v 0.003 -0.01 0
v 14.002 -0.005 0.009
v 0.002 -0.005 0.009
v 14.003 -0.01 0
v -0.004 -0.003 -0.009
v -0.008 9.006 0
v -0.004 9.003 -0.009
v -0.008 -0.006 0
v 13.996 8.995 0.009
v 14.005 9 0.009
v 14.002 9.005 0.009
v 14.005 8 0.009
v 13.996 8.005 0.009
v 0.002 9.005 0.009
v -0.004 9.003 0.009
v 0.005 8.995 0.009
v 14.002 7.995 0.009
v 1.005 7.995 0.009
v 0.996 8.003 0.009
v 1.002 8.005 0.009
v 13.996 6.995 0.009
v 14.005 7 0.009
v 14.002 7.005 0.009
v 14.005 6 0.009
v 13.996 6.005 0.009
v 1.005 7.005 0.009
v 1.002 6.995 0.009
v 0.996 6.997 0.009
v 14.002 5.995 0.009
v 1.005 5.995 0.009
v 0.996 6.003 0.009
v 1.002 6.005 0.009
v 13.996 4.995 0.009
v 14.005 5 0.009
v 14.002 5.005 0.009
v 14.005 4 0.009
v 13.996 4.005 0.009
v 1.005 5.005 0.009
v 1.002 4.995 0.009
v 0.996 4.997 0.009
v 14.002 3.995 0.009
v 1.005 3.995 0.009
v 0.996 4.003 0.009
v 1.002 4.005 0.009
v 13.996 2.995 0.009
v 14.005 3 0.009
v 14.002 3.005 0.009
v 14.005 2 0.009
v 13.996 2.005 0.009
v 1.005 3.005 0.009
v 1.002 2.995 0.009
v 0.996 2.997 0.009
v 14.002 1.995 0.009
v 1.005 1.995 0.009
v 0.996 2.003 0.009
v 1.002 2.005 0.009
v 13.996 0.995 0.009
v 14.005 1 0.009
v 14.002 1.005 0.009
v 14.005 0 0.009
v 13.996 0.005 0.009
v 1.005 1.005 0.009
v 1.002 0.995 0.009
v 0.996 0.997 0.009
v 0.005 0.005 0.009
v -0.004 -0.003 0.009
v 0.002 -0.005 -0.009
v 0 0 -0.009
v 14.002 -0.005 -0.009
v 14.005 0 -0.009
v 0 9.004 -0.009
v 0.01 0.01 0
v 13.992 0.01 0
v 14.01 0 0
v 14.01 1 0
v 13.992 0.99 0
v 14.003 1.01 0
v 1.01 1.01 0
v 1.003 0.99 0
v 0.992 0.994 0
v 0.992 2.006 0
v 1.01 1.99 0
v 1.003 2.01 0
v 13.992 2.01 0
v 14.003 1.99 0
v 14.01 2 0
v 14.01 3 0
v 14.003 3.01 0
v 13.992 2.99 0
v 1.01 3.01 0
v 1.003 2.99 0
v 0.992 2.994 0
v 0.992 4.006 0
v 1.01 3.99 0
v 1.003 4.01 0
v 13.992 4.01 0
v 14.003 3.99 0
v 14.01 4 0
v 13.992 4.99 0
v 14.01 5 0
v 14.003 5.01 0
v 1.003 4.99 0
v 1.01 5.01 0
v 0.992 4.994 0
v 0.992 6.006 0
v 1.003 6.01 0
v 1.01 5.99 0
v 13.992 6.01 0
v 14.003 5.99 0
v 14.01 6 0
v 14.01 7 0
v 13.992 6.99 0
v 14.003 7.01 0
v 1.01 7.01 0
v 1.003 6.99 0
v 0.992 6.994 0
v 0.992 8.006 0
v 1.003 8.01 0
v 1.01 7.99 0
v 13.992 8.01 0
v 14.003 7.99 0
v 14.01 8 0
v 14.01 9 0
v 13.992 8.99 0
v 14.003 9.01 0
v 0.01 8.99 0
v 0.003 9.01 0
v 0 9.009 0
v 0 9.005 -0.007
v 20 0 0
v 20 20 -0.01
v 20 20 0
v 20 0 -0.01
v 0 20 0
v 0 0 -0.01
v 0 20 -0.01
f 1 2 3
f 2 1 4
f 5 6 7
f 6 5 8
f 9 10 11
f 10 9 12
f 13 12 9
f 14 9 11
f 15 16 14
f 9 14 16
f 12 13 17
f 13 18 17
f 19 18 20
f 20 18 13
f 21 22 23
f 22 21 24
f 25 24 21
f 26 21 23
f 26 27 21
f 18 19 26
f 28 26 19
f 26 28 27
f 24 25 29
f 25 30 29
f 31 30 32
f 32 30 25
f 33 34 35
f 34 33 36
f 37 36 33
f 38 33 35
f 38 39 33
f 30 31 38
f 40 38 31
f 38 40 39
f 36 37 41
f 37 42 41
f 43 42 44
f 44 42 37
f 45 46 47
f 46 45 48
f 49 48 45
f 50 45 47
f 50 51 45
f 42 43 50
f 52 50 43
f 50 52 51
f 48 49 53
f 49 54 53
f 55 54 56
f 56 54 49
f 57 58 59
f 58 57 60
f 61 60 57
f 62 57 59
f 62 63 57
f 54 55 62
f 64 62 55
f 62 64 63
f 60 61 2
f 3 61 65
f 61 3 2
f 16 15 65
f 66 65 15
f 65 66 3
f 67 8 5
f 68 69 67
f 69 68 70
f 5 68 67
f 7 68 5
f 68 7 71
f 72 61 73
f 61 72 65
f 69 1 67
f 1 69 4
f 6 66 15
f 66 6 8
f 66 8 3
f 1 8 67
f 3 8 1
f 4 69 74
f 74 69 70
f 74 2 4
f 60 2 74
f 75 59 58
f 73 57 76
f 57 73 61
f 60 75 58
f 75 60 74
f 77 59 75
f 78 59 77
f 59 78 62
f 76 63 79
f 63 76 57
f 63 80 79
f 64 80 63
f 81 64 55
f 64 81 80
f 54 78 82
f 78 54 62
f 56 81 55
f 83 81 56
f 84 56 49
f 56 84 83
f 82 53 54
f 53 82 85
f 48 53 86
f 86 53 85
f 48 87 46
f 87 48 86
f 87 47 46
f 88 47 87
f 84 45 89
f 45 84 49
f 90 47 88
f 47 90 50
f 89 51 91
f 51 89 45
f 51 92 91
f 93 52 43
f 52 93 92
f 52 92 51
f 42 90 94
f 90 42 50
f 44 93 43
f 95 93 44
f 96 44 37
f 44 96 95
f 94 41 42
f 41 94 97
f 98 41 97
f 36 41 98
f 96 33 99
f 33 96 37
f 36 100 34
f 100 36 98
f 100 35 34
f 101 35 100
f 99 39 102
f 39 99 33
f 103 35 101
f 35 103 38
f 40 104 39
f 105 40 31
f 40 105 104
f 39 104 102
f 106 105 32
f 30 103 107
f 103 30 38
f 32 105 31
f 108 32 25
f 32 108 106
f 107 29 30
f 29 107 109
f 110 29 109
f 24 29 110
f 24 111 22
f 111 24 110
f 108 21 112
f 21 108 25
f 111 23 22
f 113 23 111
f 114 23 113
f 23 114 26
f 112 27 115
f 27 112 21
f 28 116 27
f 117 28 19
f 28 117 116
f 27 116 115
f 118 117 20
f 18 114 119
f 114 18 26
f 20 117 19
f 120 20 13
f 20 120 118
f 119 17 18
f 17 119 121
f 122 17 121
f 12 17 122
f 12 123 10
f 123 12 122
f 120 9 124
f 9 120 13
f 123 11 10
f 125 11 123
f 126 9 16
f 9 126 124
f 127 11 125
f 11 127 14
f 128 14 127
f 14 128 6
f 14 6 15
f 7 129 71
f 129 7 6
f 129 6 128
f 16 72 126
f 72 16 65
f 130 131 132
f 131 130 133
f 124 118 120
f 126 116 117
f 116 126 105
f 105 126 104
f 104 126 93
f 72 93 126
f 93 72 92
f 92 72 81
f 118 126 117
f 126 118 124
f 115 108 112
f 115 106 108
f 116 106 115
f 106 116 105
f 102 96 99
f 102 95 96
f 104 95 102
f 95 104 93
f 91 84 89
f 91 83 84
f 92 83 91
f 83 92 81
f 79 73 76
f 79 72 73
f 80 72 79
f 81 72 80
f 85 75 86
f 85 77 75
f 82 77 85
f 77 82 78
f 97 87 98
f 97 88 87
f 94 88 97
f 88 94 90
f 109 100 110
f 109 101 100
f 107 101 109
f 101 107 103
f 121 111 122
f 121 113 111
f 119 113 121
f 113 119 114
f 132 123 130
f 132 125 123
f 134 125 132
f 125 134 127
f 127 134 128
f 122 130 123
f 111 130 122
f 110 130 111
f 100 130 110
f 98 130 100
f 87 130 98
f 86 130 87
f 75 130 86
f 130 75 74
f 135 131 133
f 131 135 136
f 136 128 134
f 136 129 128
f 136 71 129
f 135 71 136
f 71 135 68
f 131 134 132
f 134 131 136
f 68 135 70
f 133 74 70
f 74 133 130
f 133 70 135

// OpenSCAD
hull(){
    translate([0, 0]) sphere(0.01);
    translate([1, 0]) sphere(0.01);
}
hull(){
    translate([1, 0]) sphere(0.01);
    translate([2, 0]) sphere(0.01);
}
hull(){
    translate([2, 0]) sphere(0.01);
    translate([3, 0]) sphere(0.01);
}
hull(){
    translate([3, 0]) sphere(0.01);
    translate([4, 0]) sphere(0.01);
}
hull(){
    translate([4, 0]) sphere(0.01);
    translate([5, 0]) sphere(0.01);
}
hull(){
    translate([5, 0]) sphere(0.01);
    translate([6, 0]) sphere(0.01);
}
hull(){
    translate([6, 0]) sphere(0.01);
    translate([7, 0]) sphere(0.01);
}
hull(){
    translate([7, 0]) sphere(0.01);
    translate([8, 0]) sphere(0.01);
}
hull(){
    translate([8, 0]) sphere(0.01);
    translate([9, 0]) sphere(0.01);
}
hull(){
    translate([9, 0]) sphere(0.01);
    translate([10, 0]) sphere(0.01);
}
hull(){
    translate([10, 0]) sphere(0.01);
    translate([11, 0]) sphere(0.01);
}
hull(){
    translate([11, 0]) sphere(0.01);
    translate([12, 0]) sphere(0.01);
}
hull(){
    translate([12, 0]) sphere(0.01);
    translate([13, 0]) sphere(0.01);
}
hull(){
    translate([13, 0]) sphere(0.01);
    translate([14, 0]) sphere(0.01);
}
hull(){
    translate([14, 0]) sphere(0.01);
    translate([14, 1]) sphere(0.01);
}
hull(){
    translate([14, 1]) sphere(0.01);
    translate([13, 1]) sphere(0.01);
}
hull(){
    translate([13, 1]) sphere(0.01);
    translate([12, 1]) sphere(0.01);
}
hull(){
    translate([12, 1]) sphere(0.01);
    translate([11, 1]) sphere(0.01);
}
hull(){
    translate([11, 1]) sphere(0.01);
    translate([10, 1]) sphere(0.01);
}
hull(){
    translate([10, 1]) sphere(0.01);
    translate([9, 1]) sphere(0.01);
}
hull(){
    translate([9, 1]) sphere(0.01);
    translate([8, 1]) sphere(0.01);
}
hull(){
    translate([8, 1]) sphere(0.01);
    translate([7, 1]) sphere(0.01);
}
hull(){
    translate([7, 1]) sphere(0.01);
    translate([6, 1]) sphere(0.01);
}
hull(){
    translate([6, 1]) sphere(0.01);
    translate([5, 1]) sphere(0.01);
}
hull(){
    translate([5, 1]) sphere(0.01);
    translate([4, 1]) sphere(0.01);
}
hull(){
    translate([4, 1]) sphere(0.01);
    translate([3, 1]) sphere(0.01);
}
hull(){
    translate([3, 1]) sphere(0.01);
    translate([2, 1]) sphere(0.01);
}
hull(){
    translate([2, 1]) sphere(0.01);
    translate([1, 1]) sphere(0.01);
}
hull(){
    translate([1, 1]) sphere(0.01);
    translate([1, 2]) sphere(0.01);
}
hull(){
    translate([1, 2]) sphere(0.01);
    translate([2, 2]) sphere(0.01);
}
hull(){
    translate([2, 2]) sphere(0.01);
    translate([3, 2]) sphere(0.01);
}
hull(){
    translate([3, 2]) sphere(0.01);
    translate([4, 2]) sphere(0.01);
}
hull(){
    translate([4, 2]) sphere(0.01);
    translate([5, 2]) sphere(0.01);
}
hull(){
    translate([5, 2]) sphere(0.01);
    translate([6, 2]) sphere(0.01);
}
hull(){
    translate([6, 2]) sphere(0.01);
    translate([7, 2]) sphere(0.01);
}
hull(){
    translate([7, 2]) sphere(0.01);
    translate([8, 2]) sphere(0.01);
}
hull(){
    translate([8, 2]) sphere(0.01);
    translate([9, 2]) sphere(0.01);
}
hull(){
    translate([9, 2]) sphere(0.01);
    translate([10, 2]) sphere(0.01);
}
hull(){
    translate([10, 2]) sphere(0.01);
    translate([11, 2]) sphere(0.01);
}
hull(){
    translate([11, 2]) sphere(0.01);
    translate([12, 2]) sphere(0.01);
}
hull(){
    translate([12, 2]) sphere(0.01);
    translate([13, 2]) sphere(0.01);
}
hull(){
    translate([13, 2]) sphere(0.01);
    translate([14, 2]) sphere(0.01);
}
hull(){
    translate([14, 2]) sphere(0.01);
    translate([14, 3]) sphere(0.01);
}
hull(){
    translate([14, 3]) sphere(0.01);
    translate([13, 3]) sphere(0.01);
}
hull(){
    translate([13, 3]) sphere(0.01);
    translate([12, 3]) sphere(0.01);
}
hull(){
    translate([12, 3]) sphere(0.01);
    translate([11, 3]) sphere(0.01);
}
hull(){
    translate([11, 3]) sphere(0.01);
    translate([10, 3]) sphere(0.01);
}
hull(){
    translate([10, 3]) sphere(0.01);
    translate([9, 3]) sphere(0.01);
}
hull(){
    translate([9, 3]) sphere(0.01);
    translate([8, 3]) sphere(0.01);
}
hull(){
    translate([8, 3]) sphere(0.01);
    translate([7, 3]) sphere(0.01);
}
hull(){
    translate([7, 3]) sphere(0.01);
    translate([6, 3]) sphere(0.01);
}
hull(){
    translate([6, 3]) sphere(0.01);
    translate([5, 3]) sphere(0.01);
}
hull(){
    translate([5, 3]) sphere(0.01);
    translate([4, 3]) sphere(0.01);
}
hull(){
    translate([4, 3]) sphere(0.01);
    translate([3, 3]) sphere(0.01);
}
hull(){
    translate([3, 3]) sphere(0.01);
    translate([2, 3]) sphere(0.01);
}
hull(){
    translate([2, 3]) sphere(0.01);
    translate([1, 3]) sphere(0.01);
}
hull(){
    translate([1, 3]) sphere(0.01);
    translate([1, 4]) sphere(0.01);
}
hull(){
    translate([1, 4]) sphere(0.01);
    translate([2, 4]) sphere(0.01);
}
hull(){
    translate([2, 4]) sphere(0.01);
    translate([3, 4]) sphere(0.01);
}
hull(){
    translate([3, 4]) sphere(0.01);
    translate([4, 4]) sphere(0.01);
}
hull(){
    translate([4, 4]) sphere(0.01);
    translate([5, 4]) sphere(0.01);
}
hull(){
    translate([5, 4]) sphere(0.01);
    translate([6, 4]) sphere(0.01);
}
hull(){
    translate([6, 4]) sphere(0.01);
    translate([7, 4]) sphere(0.01);
}
hull(){
    translate([7, 4]) sphere(0.01);
    translate([8, 4]) sphere(0.01);
}
hull(){
    translate([8, 4]) sphere(0.01);
    translate([9, 4]) sphere(0.01);
}
hull(){
    translate([9, 4]) sphere(0.01);
    translate([10, 4]) sphere(0.01);
}
hull(){
    translate([10, 4]) sphere(0.01);
    translate([11, 4]) sphere(0.01);
}
hull(){
    translate([11, 4]) sphere(0.01);
    translate([12, 4]) sphere(0.01);
}
hull(){
    translate([12, 4]) sphere(0.01);
    translate([13, 4]) sphere(0.01);
}
hull(){
    translate([13, 4]) sphere(0.01);
    translate([14, 4]) sphere(0.01);
}
hull(){
    translate([14, 4]) sphere(0.01);
    translate([14, 5]) sphere(0.01);
}
hull(){
    translate([14, 5]) sphere(0.01);
    translate([13, 5]) sphere(0.01);
}
hull(){
    translate([13, 5]) sphere(0.01);
    translate([12, 5]) sphere(0.01);
}
hull(){
    translate([12, 5]) sphere(0.01);
    translate([11, 5]) sphere(0.01);
}
hull(){
    translate([11, 5]) sphere(0.01);
    translate([10, 5]) sphere(0.01);
}
hull(){
    translate([10, 5]) sphere(0.01);
    translate([9, 5]) sphere(0.01);
}
hull(){
    translate([9, 5]) sphere(0.01);
    translate([8, 5]) sphere(0.01);
}
hull(){
    translate([8, 5]) sphere(0.01);
    translate([7, 5]) sphere(0.01);
}
hull(){
    translate([7, 5]) sphere(0.01);
    translate([6, 5]) sphere(0.01);
}
hull(){
    translate([6, 5]) sphere(0.01);
    translate([5, 5]) sphere(0.01);
}
hull(){
    translate([5, 5]) sphere(0.01);
    translate([4, 5]) sphere(0.01);
}
hull(){
    translate([4, 5]) sphere(0.01);
    translate([3, 5]) sphere(0.01);
}
hull(){
    translate([3, 5]) sphere(0.01);
    translate([2, 5]) sphere(0.01);
}
hull(){
    translate([2, 5]) sphere(0.01);
    translate([1, 5]) sphere(0.01);
}
hull(){
    translate([1, 5]) sphere(0.01);
    translate([1, 6]) sphere(0.01);
}
hull(){
    translate([1, 6]) sphere(0.01);
    translate([2, 6]) sphere(0.01);
}
hull(){
    translate([2, 6]) sphere(0.01);
    translate([3, 6]) sphere(0.01);
}
hull(){
    translate([3, 6]) sphere(0.01);
    translate([4, 6]) sphere(0.01);
}
hull(){
    translate([4, 6]) sphere(0.01);
    translate([5, 6]) sphere(0.01);
}
hull(){
    translate([5, 6]) sphere(0.01);
    translate([6, 6]) sphere(0.01);
}
hull(){
    translate([6, 6]) sphere(0.01);
    translate([7, 6]) sphere(0.01);
}
hull(){
    translate([7, 6]) sphere(0.01);
    translate([8, 6]) sphere(0.01);
}
hull(){
    translate([8, 6]) sphere(0.01);
    translate([9, 6]) sphere(0.01);
}
hull(){
    translate([9, 6]) sphere(0.01);
    translate([10, 6]) sphere(0.01);
}
hull(){
    translate([10, 6]) sphere(0.01);
    translate([11, 6]) sphere(0.01);
}
hull(){
    translate([11, 6]) sphere(0.01);
    translate([12, 6]) sphere(0.01);
}
hull(){
    translate([12, 6]) sphere(0.01);
    translate([13, 6]) sphere(0.01);
}
hull(){
    translate([13, 6]) sphere(0.01);
    translate([14, 6]) sphere(0.01);
}
hull(){
    translate([14, 6]) sphere(0.01);
    translate([14, 7]) sphere(0.01);
}
hull(){
    translate([14, 7]) sphere(0.01);
    translate([13, 7]) sphere(0.01);
}
hull(){
    translate([13, 7]) sphere(0.01);
    translate([12, 7]) sphere(0.01);
}
hull(){
    translate([12, 7]) sphere(0.01);
    translate([11, 7]) sphere(0.01);
}
hull(){
    translate([11, 7]) sphere(0.01);
    translate([10, 7]) sphere(0.01);
}
hull(){
    translate([10, 7]) sphere(0.01);
    translate([9, 7]) sphere(0.01);
}
hull(){
    translate([9, 7]) sphere(0.01);
    translate([8, 7]) sphere(0.01);
}
hull(){
    translate([8, 7]) sphere(0.01);
    translate([7, 7]) sphere(0.01);
}
hull(){
    translate([7, 7]) sphere(0.01);
    translate([6, 7]) sphere(0.01);
}
hull(){
    translate([6, 7]) sphere(0.01);
    translate([5, 7]) sphere(0.01);
}
hull(){
    translate([5, 7]) sphere(0.01);
    translate([4, 7]) sphere(0.01);
}
hull(){
    translate([4, 7]) sphere(0.01);
    translate([3, 7]) sphere(0.01);
}
hull(){
    translate([3, 7]) sphere(0.01);
    translate([2, 7]) sphere(0.01);
}
hull(){
    translate([2, 7]) sphere(0.01);
    translate([1, 7]) sphere(0.01);
}
hull(){
    translate([1, 7]) sphere(0.01);
    translate([1, 8]) sphere(0.01);
}
hull(){
    translate([1, 8]) sphere(0.01);
    translate([2, 8]) sphere(0.01);
}
hull(){
    translate([2, 8]) sphere(0.01);
    translate([3, 8]) sphere(0.01);
}
hull(){
    translate([3, 8]) sphere(0.01);
    translate([4, 8]) sphere(0.01);
}
hull(){
    translate([4, 8]) sphere(0.01);
    translate([5, 8]) sphere(0.01);
}
hull(){
    translate([5, 8]) sphere(0.01);
    translate([6, 8]) sphere(0.01);
}
hull(){
    translate([6, 8]) sphere(0.01);
    translate([7, 8]) sphere(0.01);
}
hull(){
    translate([7, 8]) sphere(0.01);
    translate([8, 8]) sphere(0.01);
}
hull(){
    translate([8, 8]) sphere(0.01);
    translate([9, 8]) sphere(0.01);
}
hull(){
    translate([9, 8]) sphere(0.01);
    translate([10, 8]) sphere(0.01);
}
hull(){
    translate([10, 8]) sphere(0.01);
    translate([11, 8]) sphere(0.01);
}
hull(){
    translate([11, 8]) sphere(0.01);
    translate([12, 8]) sphere(0.01);
}
hull(){
    translate([12, 8]) sphere(0.01);
    translate([13, 8]) sphere(0.01);
}
hull(){
    translate([13, 8]) sphere(0.01);
    translate([14, 8]) sphere(0.01);
}
hull(){
    translate([14, 8]) sphere(0.01);
    translate([14, 9]) sphere(0.01);
}
hull(){
    translate([14, 9]) sphere(0.01);
    translate([13, 9]) sphere(0.01);
}
hull(){
    translate([13, 9]) sphere(0.01);
    translate([12, 9]) sphere(0.01);
}
hull(){
    translate([12, 9]) sphere(0.01);
    translate([11, 9]) sphere(0.01);
}
hull(){
    translate([11, 9]) sphere(0.01);
    translate([10, 9]) sphere(0.01);
}
hull(){
    translate([10, 9]) sphere(0.01);
    translate([9, 9]) sphere(0.01);
}
hull(){
    translate([9, 9]) sphere(0.01);
    translate([8, 9]) sphere(0.01);
}
hull(){
    translate([8, 9]) sphere(0.01);
    translate([7, 9]) sphere(0.01);
}
hull(){
    translate([7, 9]) sphere(0.01);
    translate([6, 9]) sphere(0.01);
}
hull(){
    translate([6, 9]) sphere(0.01);
    translate([5, 9]) sphere(0.01);
}
hull(){
    translate([5, 9]) sphere(0.01);
    translate([4, 9]) sphere(0.01);
}
hull(){
    translate([4, 9]) sphere(0.01);
    translate([3, 9]) sphere(0.01);
}
hull(){
    translate([3, 9]) sphere(0.01);
    translate([2, 9]) sphere(0.01);
}
hull(){
    translate([2, 9]) sphere(0.01);
    translate([1, 9]) sphere(0.01);
}
hull(){
    translate([1, 9]) sphere(0.01);
    translate([0, 9]) sphere(0.01);
}
hull(){
    translate([0, 9]) sphere(0.01);
    translate([0, 8]) sphere(0.01);
}
hull(){
    translate([0, 8]) sphere(0.01);
    translate([0, 7]) sphere(0.01);
}
hull(){
    translate([0, 7]) sphere(0.01);
    translate([0, 6]) sphere(0.01);
}
hull(){
    translate([0, 6]) sphere(0.01);
    translate([0, 5]) sphere(0.01);
}
hull(){
    translate([0, 5]) sphere(0.01);
    translate([0, 4]) sphere(0.01);
}
hull(){
    translate([0, 4]) sphere(0.01);
    translate([0, 3]) sphere(0.01);
}
hull(){
    translate([0, 3]) sphere(0.01);
    translate([0, 2]) sphere(0.01);
}
hull(){
    translate([0, 2]) sphere(0.01);
    translate([0, 1]) sphere(0.01);
}
hull(){
    translate([0, 1]) sphere(0.01);
    translate([0, 0]) sphere(0.01);
}
translate([0,0,-0.01]) color([0.1,0.1,0.1]) cube([20,20,0.01]);
